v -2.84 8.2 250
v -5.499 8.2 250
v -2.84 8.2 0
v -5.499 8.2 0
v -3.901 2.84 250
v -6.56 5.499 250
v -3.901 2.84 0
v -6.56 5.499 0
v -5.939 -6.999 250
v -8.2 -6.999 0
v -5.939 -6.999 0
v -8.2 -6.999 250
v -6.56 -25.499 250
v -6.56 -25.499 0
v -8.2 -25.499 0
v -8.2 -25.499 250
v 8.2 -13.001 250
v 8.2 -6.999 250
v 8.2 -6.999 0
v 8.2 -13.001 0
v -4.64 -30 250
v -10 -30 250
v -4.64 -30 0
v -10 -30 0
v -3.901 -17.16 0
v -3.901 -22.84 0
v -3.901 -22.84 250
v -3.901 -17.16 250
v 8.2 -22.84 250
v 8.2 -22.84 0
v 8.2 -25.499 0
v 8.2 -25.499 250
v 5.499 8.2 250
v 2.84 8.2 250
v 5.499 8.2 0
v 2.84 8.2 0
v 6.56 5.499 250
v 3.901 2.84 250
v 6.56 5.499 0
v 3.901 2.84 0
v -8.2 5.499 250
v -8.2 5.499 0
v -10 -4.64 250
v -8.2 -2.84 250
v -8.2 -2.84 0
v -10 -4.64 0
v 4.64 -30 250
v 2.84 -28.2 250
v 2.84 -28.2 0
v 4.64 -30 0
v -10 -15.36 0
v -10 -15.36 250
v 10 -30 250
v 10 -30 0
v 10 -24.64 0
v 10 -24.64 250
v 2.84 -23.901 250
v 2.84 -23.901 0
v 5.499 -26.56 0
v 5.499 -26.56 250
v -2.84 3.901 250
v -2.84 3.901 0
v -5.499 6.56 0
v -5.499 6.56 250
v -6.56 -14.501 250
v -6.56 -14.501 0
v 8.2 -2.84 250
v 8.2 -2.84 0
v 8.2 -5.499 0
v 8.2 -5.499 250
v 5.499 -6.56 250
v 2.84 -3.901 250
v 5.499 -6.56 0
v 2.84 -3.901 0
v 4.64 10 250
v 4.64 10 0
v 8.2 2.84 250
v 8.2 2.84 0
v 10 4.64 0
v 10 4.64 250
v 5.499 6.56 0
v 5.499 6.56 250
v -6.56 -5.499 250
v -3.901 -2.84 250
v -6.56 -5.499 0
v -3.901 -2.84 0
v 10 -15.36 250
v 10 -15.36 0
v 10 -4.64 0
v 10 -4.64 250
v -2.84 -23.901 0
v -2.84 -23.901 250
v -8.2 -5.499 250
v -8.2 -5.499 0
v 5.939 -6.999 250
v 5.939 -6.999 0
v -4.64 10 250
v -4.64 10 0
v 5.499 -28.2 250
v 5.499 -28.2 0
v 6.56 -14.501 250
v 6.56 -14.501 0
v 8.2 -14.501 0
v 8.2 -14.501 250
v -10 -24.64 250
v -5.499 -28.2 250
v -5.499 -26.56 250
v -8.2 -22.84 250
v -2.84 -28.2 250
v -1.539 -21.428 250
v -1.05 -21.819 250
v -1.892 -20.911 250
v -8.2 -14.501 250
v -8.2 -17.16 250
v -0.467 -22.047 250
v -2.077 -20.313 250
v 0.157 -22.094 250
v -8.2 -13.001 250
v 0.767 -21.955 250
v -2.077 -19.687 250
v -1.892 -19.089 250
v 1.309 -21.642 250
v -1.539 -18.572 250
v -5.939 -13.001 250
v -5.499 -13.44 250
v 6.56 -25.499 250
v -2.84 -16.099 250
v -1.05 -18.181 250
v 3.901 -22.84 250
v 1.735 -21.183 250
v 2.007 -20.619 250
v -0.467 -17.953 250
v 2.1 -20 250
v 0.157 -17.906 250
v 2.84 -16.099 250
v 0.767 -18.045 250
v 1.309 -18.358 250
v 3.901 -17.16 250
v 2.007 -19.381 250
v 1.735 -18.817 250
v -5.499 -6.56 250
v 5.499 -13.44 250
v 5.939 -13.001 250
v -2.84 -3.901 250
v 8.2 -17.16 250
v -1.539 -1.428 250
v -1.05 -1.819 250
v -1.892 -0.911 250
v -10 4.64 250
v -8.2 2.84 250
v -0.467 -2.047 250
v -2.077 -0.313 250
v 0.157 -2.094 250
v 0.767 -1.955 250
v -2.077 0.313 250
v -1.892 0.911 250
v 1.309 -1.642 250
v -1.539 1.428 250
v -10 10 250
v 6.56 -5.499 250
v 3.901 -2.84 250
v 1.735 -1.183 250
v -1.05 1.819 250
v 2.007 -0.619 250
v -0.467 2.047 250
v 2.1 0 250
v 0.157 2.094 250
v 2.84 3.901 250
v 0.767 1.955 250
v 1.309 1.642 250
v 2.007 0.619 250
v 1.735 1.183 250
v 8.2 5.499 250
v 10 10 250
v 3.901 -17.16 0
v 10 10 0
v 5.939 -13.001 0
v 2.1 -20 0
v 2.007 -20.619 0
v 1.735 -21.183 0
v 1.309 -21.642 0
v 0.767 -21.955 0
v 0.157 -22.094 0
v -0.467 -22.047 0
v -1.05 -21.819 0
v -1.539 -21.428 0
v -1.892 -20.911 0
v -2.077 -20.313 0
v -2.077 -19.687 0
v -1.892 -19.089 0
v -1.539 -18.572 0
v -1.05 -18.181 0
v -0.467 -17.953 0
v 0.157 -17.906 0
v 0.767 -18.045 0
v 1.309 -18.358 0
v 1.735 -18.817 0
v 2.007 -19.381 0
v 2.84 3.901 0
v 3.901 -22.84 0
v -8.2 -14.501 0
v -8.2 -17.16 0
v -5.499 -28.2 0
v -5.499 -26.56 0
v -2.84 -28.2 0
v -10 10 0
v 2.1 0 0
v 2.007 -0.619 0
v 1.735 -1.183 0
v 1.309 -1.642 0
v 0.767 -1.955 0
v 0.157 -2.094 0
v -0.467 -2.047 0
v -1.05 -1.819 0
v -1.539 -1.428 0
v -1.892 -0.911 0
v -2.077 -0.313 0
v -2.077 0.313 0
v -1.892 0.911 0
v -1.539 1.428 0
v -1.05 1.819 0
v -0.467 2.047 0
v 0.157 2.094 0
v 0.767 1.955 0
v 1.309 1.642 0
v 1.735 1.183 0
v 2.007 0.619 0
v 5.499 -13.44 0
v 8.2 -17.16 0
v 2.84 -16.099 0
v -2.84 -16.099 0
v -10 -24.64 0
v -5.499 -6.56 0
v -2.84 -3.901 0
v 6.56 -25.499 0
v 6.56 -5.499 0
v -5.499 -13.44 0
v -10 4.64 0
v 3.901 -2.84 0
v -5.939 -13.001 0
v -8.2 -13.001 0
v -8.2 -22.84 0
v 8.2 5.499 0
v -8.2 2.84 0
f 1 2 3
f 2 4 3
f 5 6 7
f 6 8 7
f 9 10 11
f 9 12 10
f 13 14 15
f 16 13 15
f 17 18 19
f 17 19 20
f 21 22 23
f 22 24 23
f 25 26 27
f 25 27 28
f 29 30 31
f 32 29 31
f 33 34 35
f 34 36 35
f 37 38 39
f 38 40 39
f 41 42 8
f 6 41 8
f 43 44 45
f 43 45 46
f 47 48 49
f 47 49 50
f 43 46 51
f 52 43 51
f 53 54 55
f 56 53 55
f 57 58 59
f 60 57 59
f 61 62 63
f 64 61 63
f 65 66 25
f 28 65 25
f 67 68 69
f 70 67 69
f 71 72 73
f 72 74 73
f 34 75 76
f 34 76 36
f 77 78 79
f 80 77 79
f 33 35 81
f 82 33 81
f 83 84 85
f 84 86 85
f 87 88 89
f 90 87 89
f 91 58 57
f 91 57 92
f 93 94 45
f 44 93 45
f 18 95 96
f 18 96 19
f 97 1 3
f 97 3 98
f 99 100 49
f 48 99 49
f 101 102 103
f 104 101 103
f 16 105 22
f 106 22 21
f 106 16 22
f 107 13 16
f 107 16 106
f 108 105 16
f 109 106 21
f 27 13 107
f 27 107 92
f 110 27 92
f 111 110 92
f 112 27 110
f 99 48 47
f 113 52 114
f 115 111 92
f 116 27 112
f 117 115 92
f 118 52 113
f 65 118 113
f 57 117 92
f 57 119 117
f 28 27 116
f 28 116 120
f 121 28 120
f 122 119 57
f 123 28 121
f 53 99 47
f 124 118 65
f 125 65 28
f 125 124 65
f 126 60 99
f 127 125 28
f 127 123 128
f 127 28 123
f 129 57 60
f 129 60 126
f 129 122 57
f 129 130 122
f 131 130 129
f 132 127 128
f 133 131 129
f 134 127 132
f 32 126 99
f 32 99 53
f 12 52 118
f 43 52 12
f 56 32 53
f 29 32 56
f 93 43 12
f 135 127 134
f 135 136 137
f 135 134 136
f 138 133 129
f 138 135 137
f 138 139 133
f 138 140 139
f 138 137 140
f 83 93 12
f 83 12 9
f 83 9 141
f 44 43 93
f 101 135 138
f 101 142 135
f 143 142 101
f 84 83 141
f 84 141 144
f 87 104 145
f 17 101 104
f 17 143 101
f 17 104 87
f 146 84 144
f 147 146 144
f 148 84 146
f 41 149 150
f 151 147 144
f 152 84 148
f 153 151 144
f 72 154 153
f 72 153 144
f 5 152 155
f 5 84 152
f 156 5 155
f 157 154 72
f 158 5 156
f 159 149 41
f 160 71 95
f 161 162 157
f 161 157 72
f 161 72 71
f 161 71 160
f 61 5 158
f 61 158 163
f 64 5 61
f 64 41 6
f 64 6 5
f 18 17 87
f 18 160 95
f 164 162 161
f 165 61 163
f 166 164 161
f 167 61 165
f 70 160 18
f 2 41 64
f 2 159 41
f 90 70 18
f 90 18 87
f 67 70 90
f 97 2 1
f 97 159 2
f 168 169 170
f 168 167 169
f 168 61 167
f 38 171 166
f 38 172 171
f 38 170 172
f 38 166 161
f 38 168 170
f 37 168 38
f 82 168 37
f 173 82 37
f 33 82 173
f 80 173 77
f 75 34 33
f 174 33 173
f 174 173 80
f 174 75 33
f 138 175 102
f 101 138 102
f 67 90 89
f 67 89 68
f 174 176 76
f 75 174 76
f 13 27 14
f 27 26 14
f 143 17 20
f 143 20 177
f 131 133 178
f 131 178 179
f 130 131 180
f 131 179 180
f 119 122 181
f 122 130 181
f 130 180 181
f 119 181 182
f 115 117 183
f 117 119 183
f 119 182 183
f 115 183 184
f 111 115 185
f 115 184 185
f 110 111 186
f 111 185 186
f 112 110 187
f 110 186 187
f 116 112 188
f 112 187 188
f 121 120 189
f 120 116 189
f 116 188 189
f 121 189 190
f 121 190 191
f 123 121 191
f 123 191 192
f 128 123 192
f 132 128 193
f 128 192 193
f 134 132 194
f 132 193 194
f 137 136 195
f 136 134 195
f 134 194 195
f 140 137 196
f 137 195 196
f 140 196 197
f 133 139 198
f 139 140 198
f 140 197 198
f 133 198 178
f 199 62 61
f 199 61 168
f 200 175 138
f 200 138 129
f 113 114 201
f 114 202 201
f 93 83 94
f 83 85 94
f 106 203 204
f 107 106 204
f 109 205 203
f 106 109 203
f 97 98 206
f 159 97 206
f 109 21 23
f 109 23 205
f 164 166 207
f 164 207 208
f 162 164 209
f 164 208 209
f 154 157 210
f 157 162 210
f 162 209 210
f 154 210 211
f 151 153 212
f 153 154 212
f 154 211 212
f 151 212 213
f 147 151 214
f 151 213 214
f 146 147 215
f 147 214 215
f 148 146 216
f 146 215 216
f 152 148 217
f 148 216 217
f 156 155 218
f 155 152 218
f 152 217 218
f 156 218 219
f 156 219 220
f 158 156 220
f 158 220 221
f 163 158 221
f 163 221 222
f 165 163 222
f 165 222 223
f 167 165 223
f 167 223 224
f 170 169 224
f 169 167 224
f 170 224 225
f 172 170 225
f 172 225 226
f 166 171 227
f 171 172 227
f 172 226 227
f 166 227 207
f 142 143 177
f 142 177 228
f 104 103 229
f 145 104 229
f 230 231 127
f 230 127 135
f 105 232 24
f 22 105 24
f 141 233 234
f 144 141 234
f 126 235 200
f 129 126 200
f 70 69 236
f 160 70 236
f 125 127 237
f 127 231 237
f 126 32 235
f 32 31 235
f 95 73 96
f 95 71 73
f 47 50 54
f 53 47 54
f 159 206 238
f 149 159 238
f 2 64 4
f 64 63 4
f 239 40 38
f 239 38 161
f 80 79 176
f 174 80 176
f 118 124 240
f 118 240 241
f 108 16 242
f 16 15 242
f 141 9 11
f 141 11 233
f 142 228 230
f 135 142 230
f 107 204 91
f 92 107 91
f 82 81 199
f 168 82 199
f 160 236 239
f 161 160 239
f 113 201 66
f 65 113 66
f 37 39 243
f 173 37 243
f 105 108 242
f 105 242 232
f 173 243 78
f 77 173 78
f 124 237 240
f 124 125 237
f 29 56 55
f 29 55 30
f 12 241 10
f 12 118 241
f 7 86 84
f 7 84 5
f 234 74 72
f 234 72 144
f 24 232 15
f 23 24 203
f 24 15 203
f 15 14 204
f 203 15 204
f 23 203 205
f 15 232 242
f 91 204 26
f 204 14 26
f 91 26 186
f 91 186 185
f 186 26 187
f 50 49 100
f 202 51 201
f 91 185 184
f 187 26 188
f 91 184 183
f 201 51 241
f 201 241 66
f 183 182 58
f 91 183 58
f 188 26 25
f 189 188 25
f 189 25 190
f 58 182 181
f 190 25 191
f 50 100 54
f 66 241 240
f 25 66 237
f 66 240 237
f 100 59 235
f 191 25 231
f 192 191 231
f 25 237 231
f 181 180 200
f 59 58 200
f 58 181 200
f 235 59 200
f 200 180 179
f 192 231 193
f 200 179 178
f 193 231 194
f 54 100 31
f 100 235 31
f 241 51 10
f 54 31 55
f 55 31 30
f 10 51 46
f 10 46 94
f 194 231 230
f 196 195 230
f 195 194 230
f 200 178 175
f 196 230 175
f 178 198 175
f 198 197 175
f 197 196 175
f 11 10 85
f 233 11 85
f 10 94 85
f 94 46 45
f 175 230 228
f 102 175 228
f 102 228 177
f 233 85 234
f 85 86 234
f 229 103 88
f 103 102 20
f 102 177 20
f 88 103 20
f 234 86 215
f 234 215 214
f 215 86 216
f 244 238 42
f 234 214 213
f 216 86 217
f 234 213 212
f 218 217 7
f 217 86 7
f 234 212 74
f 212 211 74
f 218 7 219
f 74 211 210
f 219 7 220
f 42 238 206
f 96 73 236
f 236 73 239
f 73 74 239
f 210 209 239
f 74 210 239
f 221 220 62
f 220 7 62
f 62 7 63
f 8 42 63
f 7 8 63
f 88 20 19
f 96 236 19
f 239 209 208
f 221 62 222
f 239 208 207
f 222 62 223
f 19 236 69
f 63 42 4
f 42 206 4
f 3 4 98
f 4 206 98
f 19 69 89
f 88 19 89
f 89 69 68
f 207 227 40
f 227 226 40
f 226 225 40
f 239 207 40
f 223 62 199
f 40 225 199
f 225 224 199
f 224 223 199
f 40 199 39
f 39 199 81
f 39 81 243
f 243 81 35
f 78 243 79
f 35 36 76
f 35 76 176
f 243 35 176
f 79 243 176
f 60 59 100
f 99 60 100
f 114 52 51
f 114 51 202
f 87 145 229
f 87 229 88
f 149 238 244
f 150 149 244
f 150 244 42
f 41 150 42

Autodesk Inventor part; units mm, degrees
ref_plane "YZ Plane" through (0, 0, 0) normal (1, 0, 0) x (0, 1, 0)
ref_plane "XZ Plane" through (0, 0, 0) normal (0, 1, 0) x (-1, 0, 0)
ref_plane "XY Plane" through (0, 0, 0) normal (0, 0, 1) x (1, 0, 0)
sketch "Sketch1" plane through (0, 0, 0) normal (0, 0, 1) x (1, 0, 0)
  line L0 (-3.9007, 3.9007) -> (3.9007, 3.9007)
  line L1 (3.9007, 3.9007) -> (3.9007, -3.9007)
  line L2 (3.9007, -3.9007) -> (-3.9007, -3.9007)
  line L3 (-3.9007, -3.9007) -> (-3.9007, 3.9007)
  line L4 (0, 3.9007) -> (0, -3.9007) construction
  line L5 (-3.9007, 0) -> (3.9007, 0) construction
  circle A0 centre (0, 0) radius 2.1
  line L6 (0, 0) -> (-16.1173, 16.1173) construction
  line L7 (0, 0) -> (22.7933, 0) construction
  line L8 (-2.84, 3.9007) -> (-5.4993, 6.56)
  line L9 (-5.4993, 6.56) -> (-5.4993, 8.2)
  line L10 (-5.4993, 8.2) -> (-2.84, 8.2)
  line L11 (-2.84, 8.2) -> (-4.64, 10)
  line L12 (-4.64, 10) -> (-10, 10)
  line L13 (-10, 10) -> (-10, 4.64)
  line L14 (-10, 4.64) -> (-8.2, 2.84)
  line L15 (-8.2, 2.84) -> (-8.2, 5.4993)
  line L16 (-8.2, 5.4993) -> (-6.56, 5.4993)
  line L17 (-6.56, 5.4993) -> (-3.9007, 2.84)
  line L18 (-3.9007, 2.84) -> (-11.3102, 2.84) construction
  line L19 (-2.84, 3.9007) -> (-3.9007, 3.9007)
  line L20 (-3.9007, 2.84) -> (-3.9007, 3.9007)
  line L21 (-3.9007, -2.84) -> (-6.56, -5.4993)
  line L22 (-6.56, -5.4993) -> (-8.2, -5.4993)
  line L23 (-8.2, -5.4993) -> (-8.2, -2.84)
  line L24 (-8.2, -2.84) -> (-10, -4.64)
  line L25 (-10, -4.64) -> (-10, -10)
  line L26 (-10, -10) -> (-4.64, -10)
  line L27 (-4.64, -10) -> (-2.84, -8.2)
  line L28 (-2.84, -8.2) -> (-5.4993, -8.2)
  line L29 (-5.4993, -8.2) -> (-5.4993, -6.56)
  line L30 (-5.4993, -6.56) -> (-2.84, -3.9007)
  line L31 (-3.9007, -2.84) -> (-3.9007, -3.9007)
  line L32 (-2.84, -3.9007) -> (-3.9007, -3.9007)
  line L33 (2.84, -3.9007) -> (5.4993, -6.56)
  line L34 (5.4993, -6.56) -> (5.4993, -8.2)
  line L35 (5.4993, -8.2) -> (2.84, -8.2)
  line L36 (2.84, -8.2) -> (4.64, -10)
  line L37 (4.64, -10) -> (10, -10)
  line L38 (10, -10) -> (10, -4.64)
  line L39 (10, -4.64) -> (8.2, -2.84)
  line L40 (8.2, -2.84) -> (8.2, -5.4993)
  line L41 (8.2, -5.4993) -> (6.56, -5.4993)
  line L42 (6.56, -5.4993) -> (3.9007, -2.84)
  line L43 (2.84, -3.9007) -> (3.9007, -3.9007)
  line L44 (3.9007, -2.84) -> (3.9007, -3.9007)
  line L45 (3.9007, 2.84) -> (6.56, 5.4993)
  line L46 (6.56, 5.4993) -> (8.2, 5.4993)
  line L47 (8.2, 5.4993) -> (8.2, 2.84)
  line L48 (8.2, 2.84) -> (10, 4.64)
  line L49 (10, 4.64) -> (10, 10)
  line L50 (10, 10) -> (4.64, 10)
  line L51 (4.64, 10) -> (2.84, 8.2)
  line L52 (2.84, 8.2) -> (5.4993, 8.2)
  line L53 (5.4993, 8.2) -> (5.4993, 6.56)
  line L54 (5.4993, 6.56) -> (2.84, 3.9007)
  line L55 (3.9007, 2.84) -> (3.9007, 3.9007)
  line L56 (2.84, 3.9007) -> (3.9007, 3.9007)
  dimension "d7" = 4.2
  dimension "d8" = 135
  dimension "d9" = 1.5
  dimension "d10" = 1.64
  dimension "d11" = 1.8
  dimension "d12" = 2.84
  dimension "d13" = 10
  dimension "d16" = 360
extrude "Extrusion1" add sketch "Sketch1" along normal blind 250
pattern_linear "Rectangular Pattern1" count 2 spacing 20 along (0, -1, 0) of "Extrusion1"
sketch "Sketch2" plane through (0, 0, 250) normal (0, 0, 1) x (1, 0, 0)
  line L0 (8.2, -2.84) -> (8.2, -5.4993) projected
  line L1 (8.2, -5.4993) -> (6.56, -5.4993) projected
  line L2 (-6.56, -5.4993) -> (-8.2, -5.4993) projected
  line L3 (-8.2, -5.4993) -> (-8.2, -2.84) projected
  line L4 (-8.2, -14.5007) -> (-6.56, -14.5007) projected
  line L5 (6.56, -14.5007) -> (8.2, -14.5007) projected
  line L6 (5.4993, -11.8) -> (5.4993, -13.44) projected
  line L7 (5.4993, -13.44) -> (2.84, -16.0993) projected
  line L8 (-2.84, -16.0993) -> (-5.4993, -13.44) projected
  line L9 (-5.4993, -8.2) -> (-5.4993, -6.56) projected
  line L10 (-5.4993, -6.56) -> (-2.84, -3.9007) projected
  line L11 (2.84, -3.9007) -> (5.4993, -6.56) projected
  line L12 (2.84, -8.2) -> (4.64, -10) projected
  line L13 (-8.2, -6.9993) -> (-5.9387, -6.9993)
  line L14 (-5.9387, -6.9993) -> (-4.1231, -5.1837)
  line L15 (-4.1231, -5.1837) -> (4.1231, -5.1837)
  line L16 (4.1231, -5.1837) -> (5.9387, -6.9993)
  line L17 (5.9387, -6.9993) -> (8.2, -6.9993)
  line L18 (8.2, -6.9993) -> (8.2, -13.0007)
  line L19 (8.2, -13.0007) -> (5.9387, -13.0007)
  line L20 (5.9387, -13.0007) -> (4.2461, -14.6932)
  line L21 (4.2461, -14.6932) -> (-4.2461, -14.6932)
  line L22 (-4.2461, -14.6932) -> (-5.9387, -13.0007)
  line L23 (-5.9387, -13.0007) -> (-8.2, -13.0007)
  line L24 (-8.2, -13.0007) -> (-8.2, -6.9993)
  dimension "d23" = 1.5
  dimension "d24" = 1.5
  dimension "d25" = 1.5
  dimension "d26" = 1.5
extrude "Extrusion2" cut sketch "Sketch2" against normal up to next
equation "\"d24\" = d23"
equation "\"d25\" = d23"
equation "\"d26\" = d23"
properties part number "20x40x250mm"
